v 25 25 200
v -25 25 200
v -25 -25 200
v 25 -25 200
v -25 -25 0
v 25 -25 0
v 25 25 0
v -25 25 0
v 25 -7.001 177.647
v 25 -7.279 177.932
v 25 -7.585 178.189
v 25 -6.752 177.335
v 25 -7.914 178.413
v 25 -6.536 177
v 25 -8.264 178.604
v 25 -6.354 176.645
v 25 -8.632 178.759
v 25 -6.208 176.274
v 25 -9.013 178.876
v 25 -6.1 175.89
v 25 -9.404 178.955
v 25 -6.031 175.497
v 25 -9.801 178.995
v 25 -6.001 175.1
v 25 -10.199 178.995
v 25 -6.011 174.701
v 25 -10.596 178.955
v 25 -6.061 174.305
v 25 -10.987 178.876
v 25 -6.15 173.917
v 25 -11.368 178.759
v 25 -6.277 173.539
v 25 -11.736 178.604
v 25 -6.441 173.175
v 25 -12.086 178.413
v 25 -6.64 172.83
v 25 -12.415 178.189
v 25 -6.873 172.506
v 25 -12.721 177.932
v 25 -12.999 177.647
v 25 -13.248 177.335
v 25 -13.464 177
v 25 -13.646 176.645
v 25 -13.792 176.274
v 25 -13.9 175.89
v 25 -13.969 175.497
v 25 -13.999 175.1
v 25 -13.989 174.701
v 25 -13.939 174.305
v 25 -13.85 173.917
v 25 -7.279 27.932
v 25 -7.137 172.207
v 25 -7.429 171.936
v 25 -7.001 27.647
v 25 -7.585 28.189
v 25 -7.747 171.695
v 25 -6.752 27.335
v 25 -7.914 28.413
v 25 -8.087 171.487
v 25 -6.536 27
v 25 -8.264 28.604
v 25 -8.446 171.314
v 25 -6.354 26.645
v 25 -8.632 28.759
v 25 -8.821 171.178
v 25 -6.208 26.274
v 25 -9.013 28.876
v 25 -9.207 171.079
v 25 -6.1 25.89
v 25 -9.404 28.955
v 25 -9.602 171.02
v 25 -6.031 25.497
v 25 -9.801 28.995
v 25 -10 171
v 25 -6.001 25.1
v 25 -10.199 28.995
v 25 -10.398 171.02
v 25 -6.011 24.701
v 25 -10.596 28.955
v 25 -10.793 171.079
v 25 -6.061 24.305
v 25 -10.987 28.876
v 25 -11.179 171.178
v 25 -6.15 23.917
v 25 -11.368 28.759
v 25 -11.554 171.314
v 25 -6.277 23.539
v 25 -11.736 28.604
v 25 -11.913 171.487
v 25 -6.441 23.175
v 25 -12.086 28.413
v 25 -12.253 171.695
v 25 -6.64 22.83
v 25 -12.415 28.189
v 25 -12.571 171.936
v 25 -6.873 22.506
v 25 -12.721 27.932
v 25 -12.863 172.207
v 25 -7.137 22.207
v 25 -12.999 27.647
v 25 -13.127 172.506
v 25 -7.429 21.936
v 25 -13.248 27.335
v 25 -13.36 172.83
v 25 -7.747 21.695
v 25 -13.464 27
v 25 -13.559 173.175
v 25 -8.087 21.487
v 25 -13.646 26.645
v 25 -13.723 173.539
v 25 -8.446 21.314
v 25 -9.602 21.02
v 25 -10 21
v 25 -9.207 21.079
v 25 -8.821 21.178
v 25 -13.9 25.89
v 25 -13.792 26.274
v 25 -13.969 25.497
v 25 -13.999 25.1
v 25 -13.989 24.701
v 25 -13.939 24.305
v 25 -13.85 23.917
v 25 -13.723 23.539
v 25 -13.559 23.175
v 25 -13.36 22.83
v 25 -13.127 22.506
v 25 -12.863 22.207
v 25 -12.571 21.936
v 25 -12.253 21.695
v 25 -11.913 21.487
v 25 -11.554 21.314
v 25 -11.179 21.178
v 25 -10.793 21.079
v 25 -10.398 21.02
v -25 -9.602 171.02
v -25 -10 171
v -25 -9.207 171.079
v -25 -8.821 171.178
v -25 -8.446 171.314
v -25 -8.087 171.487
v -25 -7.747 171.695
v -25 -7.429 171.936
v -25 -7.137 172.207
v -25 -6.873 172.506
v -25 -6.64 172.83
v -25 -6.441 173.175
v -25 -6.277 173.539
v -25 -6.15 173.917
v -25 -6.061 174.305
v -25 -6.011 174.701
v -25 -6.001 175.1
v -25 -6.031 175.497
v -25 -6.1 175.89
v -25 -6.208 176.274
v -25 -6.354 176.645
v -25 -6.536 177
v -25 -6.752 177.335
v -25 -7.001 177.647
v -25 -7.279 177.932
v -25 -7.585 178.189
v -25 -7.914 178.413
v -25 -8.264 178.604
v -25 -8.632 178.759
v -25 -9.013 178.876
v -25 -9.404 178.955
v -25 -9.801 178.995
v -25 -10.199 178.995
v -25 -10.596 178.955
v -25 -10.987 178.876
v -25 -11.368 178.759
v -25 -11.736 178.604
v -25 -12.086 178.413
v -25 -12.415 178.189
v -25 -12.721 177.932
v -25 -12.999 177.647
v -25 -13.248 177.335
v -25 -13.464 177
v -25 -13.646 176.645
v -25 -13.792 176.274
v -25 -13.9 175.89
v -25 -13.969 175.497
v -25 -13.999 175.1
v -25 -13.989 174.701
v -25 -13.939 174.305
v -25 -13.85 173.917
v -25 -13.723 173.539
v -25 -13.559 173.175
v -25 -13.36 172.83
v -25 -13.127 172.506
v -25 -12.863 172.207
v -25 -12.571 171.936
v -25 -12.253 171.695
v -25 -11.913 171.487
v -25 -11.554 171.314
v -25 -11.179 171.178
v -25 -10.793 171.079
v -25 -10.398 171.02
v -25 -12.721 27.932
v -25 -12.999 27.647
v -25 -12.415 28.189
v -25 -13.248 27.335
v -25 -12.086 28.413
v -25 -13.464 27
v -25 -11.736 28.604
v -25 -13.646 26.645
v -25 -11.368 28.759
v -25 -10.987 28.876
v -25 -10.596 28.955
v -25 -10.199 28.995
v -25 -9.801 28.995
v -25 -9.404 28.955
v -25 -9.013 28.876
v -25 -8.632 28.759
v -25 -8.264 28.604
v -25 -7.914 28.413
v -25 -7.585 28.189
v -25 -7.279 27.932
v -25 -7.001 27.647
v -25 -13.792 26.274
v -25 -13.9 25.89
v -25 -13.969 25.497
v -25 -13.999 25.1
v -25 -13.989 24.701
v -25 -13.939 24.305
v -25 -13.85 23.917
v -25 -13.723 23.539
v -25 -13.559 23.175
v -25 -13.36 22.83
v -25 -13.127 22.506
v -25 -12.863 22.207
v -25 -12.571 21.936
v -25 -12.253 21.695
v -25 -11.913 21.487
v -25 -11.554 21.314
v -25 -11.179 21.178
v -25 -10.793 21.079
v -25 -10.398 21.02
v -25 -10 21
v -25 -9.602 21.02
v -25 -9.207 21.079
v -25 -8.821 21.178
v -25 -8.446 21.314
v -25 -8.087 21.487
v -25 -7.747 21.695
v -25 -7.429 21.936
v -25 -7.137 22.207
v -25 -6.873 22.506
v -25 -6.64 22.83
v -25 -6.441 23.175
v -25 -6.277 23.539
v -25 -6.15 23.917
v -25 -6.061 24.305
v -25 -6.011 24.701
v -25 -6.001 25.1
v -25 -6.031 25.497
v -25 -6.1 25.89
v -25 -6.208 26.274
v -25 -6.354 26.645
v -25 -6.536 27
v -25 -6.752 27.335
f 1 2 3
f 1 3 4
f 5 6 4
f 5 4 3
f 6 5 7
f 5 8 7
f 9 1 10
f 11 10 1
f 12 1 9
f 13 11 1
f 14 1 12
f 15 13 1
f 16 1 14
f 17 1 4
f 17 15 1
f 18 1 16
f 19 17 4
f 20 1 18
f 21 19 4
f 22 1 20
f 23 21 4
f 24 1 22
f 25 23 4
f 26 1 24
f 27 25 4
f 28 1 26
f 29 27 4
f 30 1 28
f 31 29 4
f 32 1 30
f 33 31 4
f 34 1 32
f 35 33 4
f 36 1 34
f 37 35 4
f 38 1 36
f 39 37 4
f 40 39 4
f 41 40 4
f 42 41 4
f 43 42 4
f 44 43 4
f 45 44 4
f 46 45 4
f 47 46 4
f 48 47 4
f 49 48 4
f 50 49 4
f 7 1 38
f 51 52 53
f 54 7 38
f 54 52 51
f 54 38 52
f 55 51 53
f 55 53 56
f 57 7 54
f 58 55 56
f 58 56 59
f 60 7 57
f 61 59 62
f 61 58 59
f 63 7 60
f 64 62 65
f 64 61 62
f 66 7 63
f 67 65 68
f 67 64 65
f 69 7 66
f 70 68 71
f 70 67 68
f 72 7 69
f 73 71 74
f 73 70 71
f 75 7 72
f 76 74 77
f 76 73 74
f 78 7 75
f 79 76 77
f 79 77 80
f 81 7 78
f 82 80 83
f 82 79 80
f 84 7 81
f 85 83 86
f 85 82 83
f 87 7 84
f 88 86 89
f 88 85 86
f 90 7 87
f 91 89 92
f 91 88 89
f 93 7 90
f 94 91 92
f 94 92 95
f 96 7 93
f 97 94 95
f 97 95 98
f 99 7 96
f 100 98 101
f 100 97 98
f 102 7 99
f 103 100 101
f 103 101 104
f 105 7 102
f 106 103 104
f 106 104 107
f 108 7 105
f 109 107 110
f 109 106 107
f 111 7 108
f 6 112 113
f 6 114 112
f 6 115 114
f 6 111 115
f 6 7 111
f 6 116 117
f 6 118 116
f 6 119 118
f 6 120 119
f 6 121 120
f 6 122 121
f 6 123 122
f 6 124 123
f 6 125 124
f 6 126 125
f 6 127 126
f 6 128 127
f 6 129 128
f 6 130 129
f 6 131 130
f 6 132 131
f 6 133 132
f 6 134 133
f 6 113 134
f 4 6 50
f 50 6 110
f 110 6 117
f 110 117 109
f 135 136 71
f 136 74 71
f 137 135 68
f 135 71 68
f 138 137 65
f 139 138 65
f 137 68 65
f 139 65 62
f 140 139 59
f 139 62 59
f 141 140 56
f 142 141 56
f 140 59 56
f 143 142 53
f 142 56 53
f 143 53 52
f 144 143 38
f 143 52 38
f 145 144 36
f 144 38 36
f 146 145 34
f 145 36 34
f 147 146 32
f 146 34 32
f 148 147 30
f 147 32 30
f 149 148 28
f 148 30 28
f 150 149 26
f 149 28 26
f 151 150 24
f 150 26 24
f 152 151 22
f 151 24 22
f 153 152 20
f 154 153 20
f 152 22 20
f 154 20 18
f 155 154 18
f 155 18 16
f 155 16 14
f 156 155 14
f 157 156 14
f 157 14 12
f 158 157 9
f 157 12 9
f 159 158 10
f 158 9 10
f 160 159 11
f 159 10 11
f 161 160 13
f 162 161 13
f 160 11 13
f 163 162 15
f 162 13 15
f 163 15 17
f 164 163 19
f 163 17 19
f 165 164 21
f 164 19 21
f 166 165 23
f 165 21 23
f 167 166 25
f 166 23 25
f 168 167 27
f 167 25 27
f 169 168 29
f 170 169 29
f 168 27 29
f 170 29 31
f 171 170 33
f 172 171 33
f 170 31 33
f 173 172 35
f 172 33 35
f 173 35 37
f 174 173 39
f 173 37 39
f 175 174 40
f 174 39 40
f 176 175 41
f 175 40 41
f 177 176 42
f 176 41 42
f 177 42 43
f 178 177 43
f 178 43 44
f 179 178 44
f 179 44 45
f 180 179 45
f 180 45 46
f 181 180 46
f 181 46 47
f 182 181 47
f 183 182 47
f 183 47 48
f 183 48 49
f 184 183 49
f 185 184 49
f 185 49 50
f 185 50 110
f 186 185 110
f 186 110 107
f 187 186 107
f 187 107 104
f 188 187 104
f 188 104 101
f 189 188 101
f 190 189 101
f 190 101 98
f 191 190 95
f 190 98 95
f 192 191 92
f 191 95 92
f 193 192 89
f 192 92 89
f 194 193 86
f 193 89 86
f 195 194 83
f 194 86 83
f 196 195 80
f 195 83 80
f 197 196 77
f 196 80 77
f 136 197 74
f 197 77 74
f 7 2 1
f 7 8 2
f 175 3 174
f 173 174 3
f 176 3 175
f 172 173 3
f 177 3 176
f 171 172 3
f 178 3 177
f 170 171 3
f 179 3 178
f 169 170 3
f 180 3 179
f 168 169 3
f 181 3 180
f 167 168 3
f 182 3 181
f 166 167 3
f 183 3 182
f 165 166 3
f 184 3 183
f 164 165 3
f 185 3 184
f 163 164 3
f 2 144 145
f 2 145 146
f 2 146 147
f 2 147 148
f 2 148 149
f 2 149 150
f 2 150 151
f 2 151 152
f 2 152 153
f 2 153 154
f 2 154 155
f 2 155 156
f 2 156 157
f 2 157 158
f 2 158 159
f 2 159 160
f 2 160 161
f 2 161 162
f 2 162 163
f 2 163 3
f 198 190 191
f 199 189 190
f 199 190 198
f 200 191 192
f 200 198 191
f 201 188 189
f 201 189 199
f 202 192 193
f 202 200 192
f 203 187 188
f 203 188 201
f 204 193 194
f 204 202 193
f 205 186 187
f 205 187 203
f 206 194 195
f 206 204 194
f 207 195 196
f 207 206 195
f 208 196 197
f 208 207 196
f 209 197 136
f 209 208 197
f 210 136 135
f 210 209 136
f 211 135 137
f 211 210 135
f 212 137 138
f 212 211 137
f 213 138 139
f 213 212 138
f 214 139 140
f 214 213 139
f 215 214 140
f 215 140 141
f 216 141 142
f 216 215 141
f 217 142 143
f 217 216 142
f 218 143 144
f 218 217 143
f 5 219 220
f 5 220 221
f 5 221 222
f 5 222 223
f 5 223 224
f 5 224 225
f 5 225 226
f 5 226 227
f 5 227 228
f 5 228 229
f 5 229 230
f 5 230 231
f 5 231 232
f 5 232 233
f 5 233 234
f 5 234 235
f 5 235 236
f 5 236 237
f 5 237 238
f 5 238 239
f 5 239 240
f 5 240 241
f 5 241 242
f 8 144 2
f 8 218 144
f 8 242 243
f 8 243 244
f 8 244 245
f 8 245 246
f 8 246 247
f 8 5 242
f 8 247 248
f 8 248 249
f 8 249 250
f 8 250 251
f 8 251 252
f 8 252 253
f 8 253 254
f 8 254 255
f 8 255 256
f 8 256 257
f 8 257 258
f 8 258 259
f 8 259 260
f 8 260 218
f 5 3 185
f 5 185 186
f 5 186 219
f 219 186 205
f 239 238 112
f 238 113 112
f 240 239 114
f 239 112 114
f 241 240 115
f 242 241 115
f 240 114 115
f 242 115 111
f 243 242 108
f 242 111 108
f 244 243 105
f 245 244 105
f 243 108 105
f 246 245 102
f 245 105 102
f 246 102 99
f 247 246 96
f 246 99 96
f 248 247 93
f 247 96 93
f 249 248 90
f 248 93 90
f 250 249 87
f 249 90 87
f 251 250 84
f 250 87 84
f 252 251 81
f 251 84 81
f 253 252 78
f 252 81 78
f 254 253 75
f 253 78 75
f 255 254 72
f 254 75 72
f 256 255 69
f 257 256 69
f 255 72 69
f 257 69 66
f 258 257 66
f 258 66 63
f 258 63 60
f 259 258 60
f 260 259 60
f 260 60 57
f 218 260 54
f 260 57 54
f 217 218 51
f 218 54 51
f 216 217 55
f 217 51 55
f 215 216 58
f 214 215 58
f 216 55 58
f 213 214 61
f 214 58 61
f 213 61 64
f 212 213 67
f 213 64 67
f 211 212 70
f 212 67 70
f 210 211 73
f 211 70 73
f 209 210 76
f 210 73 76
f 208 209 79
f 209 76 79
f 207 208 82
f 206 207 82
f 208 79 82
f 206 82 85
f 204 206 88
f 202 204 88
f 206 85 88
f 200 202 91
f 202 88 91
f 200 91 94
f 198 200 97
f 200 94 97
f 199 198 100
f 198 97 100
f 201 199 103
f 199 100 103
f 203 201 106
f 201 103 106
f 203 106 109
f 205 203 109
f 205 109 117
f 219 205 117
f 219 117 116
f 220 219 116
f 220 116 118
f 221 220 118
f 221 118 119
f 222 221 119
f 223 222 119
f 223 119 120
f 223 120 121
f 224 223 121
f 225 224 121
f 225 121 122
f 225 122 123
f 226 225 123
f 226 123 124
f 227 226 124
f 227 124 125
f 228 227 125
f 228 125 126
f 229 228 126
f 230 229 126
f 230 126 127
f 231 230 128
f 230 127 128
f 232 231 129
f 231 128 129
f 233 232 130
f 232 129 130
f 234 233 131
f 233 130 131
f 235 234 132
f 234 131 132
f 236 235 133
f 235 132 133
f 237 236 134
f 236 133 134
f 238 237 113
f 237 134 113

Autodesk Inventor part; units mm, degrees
ref_plane "YZ Plane" through (0, 0, 0) normal (1, 0, 0) x (0, 1, 0)
ref_plane "XZ Plane" through (0, 0, 0) normal (0, 1, 0) x (-1, 0, 0)
ref_plane "XY Plane" through (0, 0, 0) normal (0, 0, 1) x (1, 0, 0)
sketch "Sketch1" plane through (0, 0, 0) normal (0, 0, 1) x (1, 0, 0)
  line L0 (25, -25) -> (-25, -25)
  line L1 (-25, -25) -> (-25, 25)
  line L2 (-25, 25) -> (25, 25)
  line L3 (25, 25) -> (25, -25)
  line L4 (25, -25) -> (-25, 25) construction
  line L5 (-25, -25) -> (25, 25) construction
  point P0 (0, 0)
  dimension "d0" = 50
  dimension "d1" = 50
extrude "Extrusion1" add sketch "Sketch1" along normal blind 200
sketch "Sketch2" plane through (25, -25, 0) normal (1, 0, 0) x (0, 0, -1)
  circle A0 centre (-175, 15) radius 4
  circle A1 centre (-25, 15) radius 4
  line L0 (0, 0) -> (-200, 0) projected
  line L1 (-200, 0) -> (-200, 50) projected
  point P0 (0, 25)
  dimension "d4" = 8
  dimension "d5" = 15
  dimension "d6" = 8
  dimension "d7" = 15
  dimension "d8" = 25
  dimension "d9" = 25
extrude "Extrusion2" cut sketch "Sketch2" against normal through all
properties part number "Blok_roda"
